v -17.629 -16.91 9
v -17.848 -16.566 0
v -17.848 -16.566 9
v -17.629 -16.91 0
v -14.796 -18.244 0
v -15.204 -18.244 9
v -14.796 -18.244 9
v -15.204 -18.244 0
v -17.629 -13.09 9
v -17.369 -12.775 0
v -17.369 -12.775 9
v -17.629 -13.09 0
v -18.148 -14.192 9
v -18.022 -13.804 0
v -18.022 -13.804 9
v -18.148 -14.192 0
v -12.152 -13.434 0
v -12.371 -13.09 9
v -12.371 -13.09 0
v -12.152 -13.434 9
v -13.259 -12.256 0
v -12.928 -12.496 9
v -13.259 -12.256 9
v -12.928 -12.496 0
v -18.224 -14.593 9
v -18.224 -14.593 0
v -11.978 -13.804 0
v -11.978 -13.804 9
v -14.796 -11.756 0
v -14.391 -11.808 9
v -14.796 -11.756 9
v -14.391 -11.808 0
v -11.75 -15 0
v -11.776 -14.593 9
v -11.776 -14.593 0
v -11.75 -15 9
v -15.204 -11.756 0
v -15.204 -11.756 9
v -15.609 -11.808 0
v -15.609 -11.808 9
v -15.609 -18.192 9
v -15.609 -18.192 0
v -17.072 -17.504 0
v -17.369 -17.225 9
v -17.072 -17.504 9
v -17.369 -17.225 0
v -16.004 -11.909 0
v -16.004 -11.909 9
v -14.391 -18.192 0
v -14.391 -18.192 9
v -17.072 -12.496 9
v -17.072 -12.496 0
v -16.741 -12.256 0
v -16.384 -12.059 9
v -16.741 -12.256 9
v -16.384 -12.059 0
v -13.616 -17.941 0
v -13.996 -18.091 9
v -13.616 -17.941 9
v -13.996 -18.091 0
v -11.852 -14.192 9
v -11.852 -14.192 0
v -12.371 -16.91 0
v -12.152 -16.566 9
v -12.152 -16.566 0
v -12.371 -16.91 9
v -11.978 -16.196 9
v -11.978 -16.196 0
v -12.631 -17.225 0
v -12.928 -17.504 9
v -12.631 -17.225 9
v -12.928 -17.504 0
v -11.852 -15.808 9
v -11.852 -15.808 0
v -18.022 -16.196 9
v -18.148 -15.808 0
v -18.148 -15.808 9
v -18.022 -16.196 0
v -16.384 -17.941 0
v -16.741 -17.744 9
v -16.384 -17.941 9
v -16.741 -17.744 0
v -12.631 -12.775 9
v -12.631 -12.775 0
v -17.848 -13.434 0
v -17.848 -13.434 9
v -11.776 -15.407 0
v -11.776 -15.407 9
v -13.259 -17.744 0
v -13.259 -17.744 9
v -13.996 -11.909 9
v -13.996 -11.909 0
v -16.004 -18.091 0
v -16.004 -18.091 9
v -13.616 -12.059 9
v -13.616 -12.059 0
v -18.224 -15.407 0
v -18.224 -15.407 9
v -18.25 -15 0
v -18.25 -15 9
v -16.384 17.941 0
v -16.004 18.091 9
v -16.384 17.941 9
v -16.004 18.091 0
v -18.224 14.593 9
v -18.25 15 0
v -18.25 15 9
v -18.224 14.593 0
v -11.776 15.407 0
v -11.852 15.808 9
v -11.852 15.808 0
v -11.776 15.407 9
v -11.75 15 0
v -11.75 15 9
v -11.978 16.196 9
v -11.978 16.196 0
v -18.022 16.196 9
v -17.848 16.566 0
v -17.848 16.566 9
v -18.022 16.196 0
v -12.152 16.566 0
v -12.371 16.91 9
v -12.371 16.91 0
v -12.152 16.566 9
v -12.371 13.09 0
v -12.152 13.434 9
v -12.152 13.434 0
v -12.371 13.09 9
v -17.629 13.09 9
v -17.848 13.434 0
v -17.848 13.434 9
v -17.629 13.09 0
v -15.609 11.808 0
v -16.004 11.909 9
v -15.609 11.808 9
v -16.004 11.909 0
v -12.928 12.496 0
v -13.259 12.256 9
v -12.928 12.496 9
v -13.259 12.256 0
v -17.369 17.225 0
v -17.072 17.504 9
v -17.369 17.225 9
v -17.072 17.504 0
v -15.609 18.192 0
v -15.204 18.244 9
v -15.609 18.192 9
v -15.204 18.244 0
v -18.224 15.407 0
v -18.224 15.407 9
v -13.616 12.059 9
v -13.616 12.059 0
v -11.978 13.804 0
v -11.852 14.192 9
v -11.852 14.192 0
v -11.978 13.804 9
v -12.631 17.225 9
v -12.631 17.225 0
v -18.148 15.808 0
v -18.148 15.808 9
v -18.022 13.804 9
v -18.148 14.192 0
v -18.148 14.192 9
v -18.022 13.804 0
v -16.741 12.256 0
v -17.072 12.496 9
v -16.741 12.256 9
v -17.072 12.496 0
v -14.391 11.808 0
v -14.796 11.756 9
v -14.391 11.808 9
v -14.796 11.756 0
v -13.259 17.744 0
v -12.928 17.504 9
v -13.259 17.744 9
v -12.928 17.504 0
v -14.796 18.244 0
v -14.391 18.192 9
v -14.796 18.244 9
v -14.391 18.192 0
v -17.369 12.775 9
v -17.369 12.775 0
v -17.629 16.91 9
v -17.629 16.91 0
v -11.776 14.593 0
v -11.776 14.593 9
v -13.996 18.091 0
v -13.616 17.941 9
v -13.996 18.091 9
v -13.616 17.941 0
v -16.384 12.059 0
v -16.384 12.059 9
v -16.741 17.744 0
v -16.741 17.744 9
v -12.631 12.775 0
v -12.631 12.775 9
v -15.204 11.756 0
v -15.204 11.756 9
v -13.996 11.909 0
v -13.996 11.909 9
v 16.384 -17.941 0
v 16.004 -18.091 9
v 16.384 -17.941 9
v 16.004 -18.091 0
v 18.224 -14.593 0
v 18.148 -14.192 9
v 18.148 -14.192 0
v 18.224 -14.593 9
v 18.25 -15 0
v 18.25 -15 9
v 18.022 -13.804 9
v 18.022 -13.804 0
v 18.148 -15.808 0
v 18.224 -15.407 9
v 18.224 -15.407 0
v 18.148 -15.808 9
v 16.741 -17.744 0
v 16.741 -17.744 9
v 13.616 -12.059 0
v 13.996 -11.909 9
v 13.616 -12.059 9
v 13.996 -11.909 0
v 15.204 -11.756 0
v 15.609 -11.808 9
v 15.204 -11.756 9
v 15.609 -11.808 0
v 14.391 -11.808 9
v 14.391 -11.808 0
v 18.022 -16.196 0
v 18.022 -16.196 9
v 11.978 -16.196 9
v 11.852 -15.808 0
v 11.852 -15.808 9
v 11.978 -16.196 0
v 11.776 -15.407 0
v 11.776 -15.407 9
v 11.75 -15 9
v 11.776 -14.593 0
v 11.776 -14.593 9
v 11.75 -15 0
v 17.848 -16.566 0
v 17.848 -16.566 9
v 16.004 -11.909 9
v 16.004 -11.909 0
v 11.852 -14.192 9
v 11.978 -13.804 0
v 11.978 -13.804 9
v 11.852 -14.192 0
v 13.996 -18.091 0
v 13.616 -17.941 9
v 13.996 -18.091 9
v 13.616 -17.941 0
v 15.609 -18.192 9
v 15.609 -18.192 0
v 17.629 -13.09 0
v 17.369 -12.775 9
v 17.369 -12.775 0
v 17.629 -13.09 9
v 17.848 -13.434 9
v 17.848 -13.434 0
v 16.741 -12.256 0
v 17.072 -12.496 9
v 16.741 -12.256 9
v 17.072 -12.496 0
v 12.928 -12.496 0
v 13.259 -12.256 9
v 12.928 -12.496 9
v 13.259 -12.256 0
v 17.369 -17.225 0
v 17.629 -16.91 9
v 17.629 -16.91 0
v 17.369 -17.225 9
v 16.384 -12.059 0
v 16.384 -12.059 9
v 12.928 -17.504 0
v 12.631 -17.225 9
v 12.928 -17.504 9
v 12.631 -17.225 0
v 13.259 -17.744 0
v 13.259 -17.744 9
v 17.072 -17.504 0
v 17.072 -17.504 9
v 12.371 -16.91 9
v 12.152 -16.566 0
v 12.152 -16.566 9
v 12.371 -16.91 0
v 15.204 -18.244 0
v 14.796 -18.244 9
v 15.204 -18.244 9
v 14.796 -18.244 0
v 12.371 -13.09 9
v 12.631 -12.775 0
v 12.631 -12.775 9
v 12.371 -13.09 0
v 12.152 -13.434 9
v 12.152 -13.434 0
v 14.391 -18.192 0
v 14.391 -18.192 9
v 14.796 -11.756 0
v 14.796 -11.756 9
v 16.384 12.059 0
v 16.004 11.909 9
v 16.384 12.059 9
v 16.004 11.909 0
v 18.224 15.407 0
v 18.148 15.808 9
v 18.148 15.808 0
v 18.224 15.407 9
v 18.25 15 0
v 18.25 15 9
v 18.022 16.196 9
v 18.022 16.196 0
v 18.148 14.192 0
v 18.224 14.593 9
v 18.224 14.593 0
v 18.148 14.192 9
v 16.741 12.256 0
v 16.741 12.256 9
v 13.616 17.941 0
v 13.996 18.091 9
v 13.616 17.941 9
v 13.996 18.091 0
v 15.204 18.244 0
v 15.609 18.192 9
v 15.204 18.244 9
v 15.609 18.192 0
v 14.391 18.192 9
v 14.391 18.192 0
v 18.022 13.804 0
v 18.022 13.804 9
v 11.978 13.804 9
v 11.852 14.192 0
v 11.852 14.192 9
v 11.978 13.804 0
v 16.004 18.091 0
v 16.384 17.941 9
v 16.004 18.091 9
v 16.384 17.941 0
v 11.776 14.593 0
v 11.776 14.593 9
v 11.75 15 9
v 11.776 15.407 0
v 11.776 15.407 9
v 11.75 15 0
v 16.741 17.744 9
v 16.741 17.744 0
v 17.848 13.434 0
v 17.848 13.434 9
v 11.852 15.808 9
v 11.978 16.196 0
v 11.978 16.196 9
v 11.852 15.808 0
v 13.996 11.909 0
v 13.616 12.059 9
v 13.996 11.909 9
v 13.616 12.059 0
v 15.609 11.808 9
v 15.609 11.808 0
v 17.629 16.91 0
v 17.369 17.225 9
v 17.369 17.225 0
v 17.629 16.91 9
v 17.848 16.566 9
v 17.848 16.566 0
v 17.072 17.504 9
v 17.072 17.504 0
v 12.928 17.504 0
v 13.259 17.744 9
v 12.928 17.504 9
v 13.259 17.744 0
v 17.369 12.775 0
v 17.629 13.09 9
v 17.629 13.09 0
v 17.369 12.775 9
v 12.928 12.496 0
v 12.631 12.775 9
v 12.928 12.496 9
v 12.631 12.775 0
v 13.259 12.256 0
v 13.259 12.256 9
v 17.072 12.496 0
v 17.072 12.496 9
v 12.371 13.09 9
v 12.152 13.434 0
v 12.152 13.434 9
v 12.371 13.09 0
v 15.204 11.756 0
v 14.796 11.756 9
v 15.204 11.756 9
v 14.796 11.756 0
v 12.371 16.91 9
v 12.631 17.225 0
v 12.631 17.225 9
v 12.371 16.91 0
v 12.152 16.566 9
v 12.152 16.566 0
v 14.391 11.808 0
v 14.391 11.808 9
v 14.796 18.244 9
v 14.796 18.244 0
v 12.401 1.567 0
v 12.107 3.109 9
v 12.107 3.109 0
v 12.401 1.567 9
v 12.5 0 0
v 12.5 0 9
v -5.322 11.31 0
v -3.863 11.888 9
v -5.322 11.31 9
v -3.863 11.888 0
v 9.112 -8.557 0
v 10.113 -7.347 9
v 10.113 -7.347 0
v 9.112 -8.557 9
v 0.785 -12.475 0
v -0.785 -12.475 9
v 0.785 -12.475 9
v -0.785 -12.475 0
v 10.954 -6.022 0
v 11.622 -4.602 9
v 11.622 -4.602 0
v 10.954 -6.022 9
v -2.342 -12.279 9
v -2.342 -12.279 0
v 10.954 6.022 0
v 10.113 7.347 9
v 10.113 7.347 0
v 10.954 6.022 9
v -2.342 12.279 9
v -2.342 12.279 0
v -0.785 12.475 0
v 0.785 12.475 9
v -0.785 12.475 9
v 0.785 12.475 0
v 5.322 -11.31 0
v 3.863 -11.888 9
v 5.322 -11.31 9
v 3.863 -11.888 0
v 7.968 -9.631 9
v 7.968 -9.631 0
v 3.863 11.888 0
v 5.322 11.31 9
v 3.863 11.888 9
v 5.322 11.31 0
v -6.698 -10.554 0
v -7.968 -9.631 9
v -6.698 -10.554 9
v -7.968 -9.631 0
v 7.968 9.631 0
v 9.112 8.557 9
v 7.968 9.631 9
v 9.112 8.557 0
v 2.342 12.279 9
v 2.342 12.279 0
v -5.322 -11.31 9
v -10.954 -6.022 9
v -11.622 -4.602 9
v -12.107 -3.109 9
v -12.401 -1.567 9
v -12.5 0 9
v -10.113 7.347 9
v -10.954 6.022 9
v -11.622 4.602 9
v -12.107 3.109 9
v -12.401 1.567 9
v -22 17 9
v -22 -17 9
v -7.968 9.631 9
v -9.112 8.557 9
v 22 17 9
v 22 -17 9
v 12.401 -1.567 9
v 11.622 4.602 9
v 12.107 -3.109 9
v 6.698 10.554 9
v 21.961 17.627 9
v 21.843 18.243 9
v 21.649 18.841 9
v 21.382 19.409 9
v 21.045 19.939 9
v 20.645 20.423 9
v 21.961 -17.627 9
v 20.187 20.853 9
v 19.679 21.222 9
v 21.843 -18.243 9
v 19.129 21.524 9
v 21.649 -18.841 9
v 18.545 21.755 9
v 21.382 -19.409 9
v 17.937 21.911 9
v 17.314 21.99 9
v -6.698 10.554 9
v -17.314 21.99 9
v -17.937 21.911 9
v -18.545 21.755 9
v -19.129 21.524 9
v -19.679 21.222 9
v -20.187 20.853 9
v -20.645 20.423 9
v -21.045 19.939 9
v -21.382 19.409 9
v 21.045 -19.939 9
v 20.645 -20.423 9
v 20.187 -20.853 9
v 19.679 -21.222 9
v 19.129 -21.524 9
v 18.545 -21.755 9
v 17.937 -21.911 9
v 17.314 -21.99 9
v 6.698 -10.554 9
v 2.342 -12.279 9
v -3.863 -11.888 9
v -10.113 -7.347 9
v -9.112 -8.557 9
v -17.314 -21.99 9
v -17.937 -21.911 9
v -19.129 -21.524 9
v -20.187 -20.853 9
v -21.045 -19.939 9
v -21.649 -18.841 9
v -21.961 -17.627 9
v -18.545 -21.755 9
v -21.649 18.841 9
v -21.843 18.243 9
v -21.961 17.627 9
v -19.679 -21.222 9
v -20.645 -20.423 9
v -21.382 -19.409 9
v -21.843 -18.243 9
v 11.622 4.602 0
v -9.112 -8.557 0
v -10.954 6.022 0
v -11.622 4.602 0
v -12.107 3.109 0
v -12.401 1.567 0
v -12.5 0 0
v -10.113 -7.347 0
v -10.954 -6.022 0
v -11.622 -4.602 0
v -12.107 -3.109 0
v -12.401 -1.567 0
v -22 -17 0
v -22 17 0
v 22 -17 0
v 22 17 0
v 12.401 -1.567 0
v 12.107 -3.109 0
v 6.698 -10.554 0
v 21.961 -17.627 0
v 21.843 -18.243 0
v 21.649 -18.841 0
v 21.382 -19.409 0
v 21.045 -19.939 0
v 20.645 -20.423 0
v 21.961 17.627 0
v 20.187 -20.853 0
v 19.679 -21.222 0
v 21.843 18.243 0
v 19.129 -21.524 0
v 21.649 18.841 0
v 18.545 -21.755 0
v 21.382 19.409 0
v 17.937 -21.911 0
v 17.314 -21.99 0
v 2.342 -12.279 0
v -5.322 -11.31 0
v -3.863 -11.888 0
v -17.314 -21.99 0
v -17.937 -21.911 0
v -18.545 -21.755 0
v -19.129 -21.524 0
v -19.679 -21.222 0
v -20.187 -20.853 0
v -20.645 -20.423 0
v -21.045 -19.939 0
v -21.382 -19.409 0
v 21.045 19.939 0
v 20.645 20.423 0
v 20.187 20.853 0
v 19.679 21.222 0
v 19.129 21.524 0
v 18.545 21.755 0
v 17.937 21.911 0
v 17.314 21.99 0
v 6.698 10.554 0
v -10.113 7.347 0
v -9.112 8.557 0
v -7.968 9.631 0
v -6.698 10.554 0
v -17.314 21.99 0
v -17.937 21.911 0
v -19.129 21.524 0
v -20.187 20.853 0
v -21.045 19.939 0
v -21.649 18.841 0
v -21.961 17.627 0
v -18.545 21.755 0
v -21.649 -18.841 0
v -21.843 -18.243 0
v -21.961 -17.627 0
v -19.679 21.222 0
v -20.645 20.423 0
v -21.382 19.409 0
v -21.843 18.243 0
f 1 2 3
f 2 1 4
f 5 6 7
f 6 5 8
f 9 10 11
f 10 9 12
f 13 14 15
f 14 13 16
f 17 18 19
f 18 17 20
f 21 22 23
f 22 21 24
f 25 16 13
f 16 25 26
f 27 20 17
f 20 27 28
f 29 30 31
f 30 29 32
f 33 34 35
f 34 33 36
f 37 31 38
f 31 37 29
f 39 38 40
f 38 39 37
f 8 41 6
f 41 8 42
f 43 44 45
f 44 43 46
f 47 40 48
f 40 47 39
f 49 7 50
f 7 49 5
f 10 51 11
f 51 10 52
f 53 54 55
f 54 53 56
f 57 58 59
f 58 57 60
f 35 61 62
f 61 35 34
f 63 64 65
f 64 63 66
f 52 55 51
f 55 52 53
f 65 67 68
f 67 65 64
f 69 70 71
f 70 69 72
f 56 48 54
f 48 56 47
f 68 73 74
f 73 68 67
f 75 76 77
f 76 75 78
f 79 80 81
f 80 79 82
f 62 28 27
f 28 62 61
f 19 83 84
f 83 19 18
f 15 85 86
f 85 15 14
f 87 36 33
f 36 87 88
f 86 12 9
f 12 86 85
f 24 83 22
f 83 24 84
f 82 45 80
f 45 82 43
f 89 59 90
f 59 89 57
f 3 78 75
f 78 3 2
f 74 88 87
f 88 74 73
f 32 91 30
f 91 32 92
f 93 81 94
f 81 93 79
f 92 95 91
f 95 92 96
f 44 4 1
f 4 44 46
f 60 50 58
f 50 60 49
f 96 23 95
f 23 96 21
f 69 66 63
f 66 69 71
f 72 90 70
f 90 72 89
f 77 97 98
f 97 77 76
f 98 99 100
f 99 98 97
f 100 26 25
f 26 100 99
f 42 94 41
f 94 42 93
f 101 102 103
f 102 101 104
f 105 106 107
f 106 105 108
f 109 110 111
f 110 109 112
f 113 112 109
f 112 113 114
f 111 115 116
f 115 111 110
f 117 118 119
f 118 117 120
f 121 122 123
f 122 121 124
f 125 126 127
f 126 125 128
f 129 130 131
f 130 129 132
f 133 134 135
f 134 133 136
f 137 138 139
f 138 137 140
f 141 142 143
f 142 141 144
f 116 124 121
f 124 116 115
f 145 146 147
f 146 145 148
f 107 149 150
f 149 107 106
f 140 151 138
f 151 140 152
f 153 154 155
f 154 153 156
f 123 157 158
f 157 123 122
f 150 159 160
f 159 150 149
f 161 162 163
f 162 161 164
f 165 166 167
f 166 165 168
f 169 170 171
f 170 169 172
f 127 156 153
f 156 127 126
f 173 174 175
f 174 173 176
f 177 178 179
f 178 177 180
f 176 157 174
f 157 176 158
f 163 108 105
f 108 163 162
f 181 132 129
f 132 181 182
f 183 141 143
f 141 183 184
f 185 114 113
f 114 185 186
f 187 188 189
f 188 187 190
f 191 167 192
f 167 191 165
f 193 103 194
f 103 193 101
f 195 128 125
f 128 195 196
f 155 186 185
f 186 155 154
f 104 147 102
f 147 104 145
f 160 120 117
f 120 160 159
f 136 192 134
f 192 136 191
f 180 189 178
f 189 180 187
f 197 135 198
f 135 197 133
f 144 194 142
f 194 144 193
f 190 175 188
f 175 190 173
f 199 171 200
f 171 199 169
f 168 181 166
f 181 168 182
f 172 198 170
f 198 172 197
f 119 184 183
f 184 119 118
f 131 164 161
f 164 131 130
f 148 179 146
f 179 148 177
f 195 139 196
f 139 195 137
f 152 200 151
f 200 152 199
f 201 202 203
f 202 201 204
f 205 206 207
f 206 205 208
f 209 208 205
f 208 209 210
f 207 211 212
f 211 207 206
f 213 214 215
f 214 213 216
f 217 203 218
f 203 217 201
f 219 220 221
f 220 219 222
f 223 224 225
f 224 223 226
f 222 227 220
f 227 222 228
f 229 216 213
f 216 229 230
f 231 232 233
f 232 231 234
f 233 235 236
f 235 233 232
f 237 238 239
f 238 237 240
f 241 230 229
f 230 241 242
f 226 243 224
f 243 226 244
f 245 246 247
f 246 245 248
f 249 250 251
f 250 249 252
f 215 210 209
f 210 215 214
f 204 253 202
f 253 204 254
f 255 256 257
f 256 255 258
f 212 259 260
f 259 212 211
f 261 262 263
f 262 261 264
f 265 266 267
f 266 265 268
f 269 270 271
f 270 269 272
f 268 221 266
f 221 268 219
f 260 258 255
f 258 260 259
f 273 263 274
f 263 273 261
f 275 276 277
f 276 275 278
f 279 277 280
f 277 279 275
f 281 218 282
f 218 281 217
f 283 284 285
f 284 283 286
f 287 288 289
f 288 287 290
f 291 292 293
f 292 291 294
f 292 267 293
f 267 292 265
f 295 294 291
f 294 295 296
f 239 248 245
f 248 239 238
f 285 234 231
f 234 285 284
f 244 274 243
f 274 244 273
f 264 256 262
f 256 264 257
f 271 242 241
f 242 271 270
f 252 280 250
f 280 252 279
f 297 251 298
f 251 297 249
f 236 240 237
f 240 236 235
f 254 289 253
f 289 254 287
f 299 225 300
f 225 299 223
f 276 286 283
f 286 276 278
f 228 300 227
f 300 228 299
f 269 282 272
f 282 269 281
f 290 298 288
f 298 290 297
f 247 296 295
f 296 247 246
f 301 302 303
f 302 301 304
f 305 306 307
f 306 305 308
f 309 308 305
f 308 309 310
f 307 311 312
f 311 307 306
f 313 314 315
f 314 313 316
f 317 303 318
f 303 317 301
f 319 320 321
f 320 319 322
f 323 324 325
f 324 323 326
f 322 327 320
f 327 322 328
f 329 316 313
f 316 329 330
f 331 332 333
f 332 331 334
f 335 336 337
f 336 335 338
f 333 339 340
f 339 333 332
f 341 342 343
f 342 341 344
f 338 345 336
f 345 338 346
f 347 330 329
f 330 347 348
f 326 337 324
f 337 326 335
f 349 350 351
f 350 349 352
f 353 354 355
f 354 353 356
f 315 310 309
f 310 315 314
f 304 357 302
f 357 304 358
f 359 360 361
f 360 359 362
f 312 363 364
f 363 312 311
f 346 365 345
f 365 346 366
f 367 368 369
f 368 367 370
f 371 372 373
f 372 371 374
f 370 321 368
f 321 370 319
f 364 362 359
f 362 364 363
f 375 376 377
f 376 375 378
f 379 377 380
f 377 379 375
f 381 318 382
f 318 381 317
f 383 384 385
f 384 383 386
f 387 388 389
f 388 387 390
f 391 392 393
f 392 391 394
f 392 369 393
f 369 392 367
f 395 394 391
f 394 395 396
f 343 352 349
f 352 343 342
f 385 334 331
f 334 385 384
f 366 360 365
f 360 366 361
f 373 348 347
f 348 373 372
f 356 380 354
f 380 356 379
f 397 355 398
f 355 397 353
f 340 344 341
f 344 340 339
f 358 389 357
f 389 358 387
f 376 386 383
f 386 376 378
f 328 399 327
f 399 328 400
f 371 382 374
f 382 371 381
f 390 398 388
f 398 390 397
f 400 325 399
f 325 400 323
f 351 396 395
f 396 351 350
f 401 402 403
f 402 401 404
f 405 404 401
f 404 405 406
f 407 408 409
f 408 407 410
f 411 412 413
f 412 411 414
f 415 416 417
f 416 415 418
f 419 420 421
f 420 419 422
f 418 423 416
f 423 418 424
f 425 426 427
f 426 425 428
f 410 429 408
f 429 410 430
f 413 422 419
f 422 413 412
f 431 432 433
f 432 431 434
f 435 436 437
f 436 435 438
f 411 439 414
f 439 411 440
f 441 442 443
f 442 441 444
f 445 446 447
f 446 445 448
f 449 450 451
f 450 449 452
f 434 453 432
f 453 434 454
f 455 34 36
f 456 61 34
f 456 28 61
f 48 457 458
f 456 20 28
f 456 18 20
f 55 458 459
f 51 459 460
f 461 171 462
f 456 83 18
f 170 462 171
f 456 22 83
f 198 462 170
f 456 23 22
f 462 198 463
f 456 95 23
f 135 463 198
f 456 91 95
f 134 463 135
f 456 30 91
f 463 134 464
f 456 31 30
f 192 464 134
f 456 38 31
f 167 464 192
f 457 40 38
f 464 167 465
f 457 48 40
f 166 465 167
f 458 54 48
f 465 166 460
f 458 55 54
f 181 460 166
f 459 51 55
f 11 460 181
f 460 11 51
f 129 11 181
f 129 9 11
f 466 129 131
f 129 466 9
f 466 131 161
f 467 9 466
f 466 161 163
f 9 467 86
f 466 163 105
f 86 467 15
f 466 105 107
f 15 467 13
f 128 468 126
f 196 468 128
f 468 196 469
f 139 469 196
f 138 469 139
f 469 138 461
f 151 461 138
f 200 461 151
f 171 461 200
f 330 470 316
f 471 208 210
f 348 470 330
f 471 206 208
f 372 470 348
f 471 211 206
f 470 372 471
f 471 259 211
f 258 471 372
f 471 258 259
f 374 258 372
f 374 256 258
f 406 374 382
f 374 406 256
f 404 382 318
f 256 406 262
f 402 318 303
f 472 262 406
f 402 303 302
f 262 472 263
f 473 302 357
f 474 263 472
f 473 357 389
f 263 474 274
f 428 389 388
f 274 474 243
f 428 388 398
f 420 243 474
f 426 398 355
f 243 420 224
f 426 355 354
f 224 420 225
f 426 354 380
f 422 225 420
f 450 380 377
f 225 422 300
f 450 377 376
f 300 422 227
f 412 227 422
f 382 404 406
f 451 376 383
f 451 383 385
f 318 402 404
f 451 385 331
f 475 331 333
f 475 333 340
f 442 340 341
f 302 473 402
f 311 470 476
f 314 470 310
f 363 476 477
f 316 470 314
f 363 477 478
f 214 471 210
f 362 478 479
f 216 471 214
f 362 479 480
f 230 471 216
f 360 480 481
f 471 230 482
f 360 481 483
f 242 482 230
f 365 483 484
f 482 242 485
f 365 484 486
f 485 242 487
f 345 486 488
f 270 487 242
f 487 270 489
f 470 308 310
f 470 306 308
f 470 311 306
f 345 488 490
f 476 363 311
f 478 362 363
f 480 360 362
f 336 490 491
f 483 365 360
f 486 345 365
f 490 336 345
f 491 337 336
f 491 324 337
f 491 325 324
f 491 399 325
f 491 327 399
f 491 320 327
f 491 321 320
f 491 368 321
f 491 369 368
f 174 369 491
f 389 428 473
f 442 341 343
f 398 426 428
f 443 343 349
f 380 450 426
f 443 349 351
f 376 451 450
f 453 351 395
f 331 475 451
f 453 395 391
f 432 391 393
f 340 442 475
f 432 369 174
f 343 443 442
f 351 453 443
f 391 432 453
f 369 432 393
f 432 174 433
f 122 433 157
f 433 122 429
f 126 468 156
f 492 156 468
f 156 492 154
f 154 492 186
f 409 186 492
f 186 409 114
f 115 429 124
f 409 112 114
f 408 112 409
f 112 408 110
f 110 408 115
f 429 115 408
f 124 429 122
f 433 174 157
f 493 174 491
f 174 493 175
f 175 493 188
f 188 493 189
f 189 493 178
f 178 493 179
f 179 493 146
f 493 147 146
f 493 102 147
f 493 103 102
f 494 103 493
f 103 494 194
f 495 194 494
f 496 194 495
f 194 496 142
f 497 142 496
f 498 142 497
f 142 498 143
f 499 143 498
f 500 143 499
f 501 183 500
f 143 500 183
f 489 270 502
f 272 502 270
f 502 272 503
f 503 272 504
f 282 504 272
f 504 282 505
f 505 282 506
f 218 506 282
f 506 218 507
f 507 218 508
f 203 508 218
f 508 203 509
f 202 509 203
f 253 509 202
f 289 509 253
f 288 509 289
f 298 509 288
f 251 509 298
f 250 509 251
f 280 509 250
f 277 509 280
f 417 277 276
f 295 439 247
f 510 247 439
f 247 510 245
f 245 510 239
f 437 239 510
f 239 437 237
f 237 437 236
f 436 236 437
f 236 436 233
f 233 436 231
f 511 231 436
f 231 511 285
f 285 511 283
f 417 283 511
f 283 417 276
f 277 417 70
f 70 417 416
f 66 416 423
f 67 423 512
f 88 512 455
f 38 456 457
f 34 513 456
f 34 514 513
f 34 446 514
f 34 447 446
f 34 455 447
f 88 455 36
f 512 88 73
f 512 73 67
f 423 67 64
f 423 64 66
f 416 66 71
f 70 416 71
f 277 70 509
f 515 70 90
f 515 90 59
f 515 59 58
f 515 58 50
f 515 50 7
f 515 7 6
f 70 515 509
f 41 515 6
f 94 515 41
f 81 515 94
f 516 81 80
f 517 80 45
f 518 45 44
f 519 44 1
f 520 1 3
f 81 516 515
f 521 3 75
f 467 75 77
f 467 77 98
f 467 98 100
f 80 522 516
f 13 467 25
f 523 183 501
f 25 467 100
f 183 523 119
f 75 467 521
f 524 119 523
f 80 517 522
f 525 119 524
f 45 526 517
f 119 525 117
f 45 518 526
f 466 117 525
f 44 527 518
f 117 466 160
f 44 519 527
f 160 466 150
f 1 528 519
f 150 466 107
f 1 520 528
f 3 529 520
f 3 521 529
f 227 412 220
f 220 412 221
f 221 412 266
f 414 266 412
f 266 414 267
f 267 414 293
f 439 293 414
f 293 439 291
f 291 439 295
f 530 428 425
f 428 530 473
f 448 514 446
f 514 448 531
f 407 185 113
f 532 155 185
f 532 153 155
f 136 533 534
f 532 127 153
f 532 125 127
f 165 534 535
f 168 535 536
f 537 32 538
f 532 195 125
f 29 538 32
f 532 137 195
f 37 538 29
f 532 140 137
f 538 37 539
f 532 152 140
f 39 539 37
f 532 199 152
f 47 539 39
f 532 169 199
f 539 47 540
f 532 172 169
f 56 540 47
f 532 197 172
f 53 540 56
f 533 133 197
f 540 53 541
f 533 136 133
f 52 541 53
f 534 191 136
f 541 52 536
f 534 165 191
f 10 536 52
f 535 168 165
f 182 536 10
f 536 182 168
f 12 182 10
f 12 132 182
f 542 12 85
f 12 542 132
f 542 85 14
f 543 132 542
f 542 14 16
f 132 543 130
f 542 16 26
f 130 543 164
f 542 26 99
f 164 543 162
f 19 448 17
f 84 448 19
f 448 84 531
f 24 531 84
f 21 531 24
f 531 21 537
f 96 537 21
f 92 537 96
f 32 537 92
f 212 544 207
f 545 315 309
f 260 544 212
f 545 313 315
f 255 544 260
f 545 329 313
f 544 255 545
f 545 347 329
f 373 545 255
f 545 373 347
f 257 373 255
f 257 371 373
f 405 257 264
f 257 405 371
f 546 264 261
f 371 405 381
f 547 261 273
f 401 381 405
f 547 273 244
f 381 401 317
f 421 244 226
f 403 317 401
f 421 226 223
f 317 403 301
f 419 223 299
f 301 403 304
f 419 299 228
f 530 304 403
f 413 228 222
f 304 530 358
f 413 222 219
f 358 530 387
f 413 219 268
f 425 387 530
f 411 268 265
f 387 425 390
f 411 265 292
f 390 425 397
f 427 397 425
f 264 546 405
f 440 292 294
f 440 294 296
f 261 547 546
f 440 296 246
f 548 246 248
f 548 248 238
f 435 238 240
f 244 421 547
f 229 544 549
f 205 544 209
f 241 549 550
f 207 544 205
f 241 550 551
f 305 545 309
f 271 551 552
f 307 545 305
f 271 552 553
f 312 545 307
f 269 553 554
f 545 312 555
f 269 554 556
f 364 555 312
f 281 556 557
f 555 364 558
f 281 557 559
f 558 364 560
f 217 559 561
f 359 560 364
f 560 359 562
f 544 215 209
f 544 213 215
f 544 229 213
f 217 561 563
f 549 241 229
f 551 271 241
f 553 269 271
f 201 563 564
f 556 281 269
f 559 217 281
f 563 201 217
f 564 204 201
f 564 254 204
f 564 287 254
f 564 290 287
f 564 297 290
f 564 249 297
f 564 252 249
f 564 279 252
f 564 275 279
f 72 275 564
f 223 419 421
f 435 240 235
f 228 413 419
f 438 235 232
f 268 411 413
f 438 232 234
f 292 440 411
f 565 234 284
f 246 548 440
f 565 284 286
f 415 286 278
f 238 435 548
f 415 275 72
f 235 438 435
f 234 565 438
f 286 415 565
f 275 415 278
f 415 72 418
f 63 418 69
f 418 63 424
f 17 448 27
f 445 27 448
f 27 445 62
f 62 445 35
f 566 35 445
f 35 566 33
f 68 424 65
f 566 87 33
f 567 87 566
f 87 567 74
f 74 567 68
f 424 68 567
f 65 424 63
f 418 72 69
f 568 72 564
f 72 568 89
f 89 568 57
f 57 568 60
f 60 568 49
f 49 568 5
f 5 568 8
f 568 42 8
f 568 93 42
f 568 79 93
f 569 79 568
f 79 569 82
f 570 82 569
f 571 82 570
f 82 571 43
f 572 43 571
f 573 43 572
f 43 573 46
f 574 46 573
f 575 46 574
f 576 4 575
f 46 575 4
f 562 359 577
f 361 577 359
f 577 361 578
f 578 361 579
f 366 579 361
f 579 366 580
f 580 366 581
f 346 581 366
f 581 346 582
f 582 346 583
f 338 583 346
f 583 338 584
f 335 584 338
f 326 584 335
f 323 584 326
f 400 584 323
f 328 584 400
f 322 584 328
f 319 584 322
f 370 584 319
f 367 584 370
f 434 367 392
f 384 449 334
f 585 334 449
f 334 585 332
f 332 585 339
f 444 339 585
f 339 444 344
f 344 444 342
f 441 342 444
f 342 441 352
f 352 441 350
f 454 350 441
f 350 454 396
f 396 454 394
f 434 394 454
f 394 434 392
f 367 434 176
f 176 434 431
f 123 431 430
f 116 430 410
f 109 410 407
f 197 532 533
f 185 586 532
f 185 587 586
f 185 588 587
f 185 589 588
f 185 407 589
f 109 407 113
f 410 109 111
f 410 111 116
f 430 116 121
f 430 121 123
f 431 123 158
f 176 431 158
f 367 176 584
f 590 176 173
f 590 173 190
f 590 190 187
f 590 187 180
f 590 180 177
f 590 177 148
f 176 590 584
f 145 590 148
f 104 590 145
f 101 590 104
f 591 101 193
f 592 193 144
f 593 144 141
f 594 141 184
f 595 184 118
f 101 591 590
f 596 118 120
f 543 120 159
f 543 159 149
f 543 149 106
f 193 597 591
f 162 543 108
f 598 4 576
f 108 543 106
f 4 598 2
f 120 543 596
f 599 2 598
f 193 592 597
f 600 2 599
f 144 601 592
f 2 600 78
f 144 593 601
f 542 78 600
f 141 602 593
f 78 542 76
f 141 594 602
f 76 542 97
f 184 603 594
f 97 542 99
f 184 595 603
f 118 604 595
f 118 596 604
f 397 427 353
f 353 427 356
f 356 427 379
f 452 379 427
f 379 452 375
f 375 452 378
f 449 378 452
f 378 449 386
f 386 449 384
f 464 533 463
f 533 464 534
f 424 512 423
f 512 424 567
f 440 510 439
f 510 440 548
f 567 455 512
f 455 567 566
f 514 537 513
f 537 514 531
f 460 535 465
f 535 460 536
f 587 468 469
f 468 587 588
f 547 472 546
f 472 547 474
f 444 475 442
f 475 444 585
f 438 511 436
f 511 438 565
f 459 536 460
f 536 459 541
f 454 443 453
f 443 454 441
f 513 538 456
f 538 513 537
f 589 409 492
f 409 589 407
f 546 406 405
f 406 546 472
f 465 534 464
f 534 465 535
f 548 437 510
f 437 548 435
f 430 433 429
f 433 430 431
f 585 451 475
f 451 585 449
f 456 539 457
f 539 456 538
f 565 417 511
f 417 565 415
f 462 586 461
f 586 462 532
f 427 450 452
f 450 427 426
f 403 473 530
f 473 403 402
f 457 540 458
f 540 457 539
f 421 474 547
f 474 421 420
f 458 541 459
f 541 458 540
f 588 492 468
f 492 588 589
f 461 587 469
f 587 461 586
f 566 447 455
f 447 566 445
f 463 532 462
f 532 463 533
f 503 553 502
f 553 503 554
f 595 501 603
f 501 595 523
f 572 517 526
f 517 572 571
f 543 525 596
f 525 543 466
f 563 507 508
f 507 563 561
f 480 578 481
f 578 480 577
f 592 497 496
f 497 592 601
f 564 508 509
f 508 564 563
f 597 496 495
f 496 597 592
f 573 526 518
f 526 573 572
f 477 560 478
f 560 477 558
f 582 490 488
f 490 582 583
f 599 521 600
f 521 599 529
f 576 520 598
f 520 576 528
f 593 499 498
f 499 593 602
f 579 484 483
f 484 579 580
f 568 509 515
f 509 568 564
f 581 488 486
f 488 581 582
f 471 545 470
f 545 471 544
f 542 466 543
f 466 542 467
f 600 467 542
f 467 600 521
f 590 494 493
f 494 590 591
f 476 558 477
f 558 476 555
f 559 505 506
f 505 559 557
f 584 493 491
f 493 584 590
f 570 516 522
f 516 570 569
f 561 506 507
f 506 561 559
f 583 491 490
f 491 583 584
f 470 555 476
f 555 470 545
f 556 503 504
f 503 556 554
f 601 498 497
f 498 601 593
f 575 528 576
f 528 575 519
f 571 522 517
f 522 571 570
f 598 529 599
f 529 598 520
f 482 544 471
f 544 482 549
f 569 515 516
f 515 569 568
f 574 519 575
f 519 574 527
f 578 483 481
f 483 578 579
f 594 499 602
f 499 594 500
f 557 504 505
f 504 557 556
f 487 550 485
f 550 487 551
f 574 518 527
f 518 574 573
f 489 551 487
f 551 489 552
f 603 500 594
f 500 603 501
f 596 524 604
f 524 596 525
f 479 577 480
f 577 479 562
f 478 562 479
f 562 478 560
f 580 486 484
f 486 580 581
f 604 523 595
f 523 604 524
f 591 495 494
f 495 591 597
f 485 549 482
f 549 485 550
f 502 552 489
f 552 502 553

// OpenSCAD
$fn = 50;


difference() {
	union() {
		hull() {
			translate(v = [-17.0000000000, 17.0000000000, 0]) {
				cylinder(h = 9, r = 5);
			}
			translate(v = [17.0000000000, 17.0000000000, 0]) {
				cylinder(h = 9, r = 5);
			}
			translate(v = [-17.0000000000, -17.0000000000, 0]) {
				cylinder(h = 9, r = 5);
			}
			translate(v = [17.0000000000, -17.0000000000, 0]) {
				cylinder(h = 9, r = 5);
			}
		}
	}
	union() {
		#translate(v = [-15.0000000000, -15.0000000000, -100.0000000000]) {
			cylinder(h = 200, r = 3.2500000000);
		}
		#translate(v = [-15.0000000000, 15.0000000000, -100.0000000000]) {
			cylinder(h = 200, r = 3.2500000000);
		}
		#translate(v = [15.0000000000, -15.0000000000, -100.0000000000]) {
			cylinder(h = 200, r = 3.2500000000);
		}
		#translate(v = [15.0000000000, 15.0000000000, -100.0000000000]) {
			cylinder(h = 200, r = 3.2500000000);
		}
		#cylinder(h = 9, r = 12.5000000000);
	}
}
